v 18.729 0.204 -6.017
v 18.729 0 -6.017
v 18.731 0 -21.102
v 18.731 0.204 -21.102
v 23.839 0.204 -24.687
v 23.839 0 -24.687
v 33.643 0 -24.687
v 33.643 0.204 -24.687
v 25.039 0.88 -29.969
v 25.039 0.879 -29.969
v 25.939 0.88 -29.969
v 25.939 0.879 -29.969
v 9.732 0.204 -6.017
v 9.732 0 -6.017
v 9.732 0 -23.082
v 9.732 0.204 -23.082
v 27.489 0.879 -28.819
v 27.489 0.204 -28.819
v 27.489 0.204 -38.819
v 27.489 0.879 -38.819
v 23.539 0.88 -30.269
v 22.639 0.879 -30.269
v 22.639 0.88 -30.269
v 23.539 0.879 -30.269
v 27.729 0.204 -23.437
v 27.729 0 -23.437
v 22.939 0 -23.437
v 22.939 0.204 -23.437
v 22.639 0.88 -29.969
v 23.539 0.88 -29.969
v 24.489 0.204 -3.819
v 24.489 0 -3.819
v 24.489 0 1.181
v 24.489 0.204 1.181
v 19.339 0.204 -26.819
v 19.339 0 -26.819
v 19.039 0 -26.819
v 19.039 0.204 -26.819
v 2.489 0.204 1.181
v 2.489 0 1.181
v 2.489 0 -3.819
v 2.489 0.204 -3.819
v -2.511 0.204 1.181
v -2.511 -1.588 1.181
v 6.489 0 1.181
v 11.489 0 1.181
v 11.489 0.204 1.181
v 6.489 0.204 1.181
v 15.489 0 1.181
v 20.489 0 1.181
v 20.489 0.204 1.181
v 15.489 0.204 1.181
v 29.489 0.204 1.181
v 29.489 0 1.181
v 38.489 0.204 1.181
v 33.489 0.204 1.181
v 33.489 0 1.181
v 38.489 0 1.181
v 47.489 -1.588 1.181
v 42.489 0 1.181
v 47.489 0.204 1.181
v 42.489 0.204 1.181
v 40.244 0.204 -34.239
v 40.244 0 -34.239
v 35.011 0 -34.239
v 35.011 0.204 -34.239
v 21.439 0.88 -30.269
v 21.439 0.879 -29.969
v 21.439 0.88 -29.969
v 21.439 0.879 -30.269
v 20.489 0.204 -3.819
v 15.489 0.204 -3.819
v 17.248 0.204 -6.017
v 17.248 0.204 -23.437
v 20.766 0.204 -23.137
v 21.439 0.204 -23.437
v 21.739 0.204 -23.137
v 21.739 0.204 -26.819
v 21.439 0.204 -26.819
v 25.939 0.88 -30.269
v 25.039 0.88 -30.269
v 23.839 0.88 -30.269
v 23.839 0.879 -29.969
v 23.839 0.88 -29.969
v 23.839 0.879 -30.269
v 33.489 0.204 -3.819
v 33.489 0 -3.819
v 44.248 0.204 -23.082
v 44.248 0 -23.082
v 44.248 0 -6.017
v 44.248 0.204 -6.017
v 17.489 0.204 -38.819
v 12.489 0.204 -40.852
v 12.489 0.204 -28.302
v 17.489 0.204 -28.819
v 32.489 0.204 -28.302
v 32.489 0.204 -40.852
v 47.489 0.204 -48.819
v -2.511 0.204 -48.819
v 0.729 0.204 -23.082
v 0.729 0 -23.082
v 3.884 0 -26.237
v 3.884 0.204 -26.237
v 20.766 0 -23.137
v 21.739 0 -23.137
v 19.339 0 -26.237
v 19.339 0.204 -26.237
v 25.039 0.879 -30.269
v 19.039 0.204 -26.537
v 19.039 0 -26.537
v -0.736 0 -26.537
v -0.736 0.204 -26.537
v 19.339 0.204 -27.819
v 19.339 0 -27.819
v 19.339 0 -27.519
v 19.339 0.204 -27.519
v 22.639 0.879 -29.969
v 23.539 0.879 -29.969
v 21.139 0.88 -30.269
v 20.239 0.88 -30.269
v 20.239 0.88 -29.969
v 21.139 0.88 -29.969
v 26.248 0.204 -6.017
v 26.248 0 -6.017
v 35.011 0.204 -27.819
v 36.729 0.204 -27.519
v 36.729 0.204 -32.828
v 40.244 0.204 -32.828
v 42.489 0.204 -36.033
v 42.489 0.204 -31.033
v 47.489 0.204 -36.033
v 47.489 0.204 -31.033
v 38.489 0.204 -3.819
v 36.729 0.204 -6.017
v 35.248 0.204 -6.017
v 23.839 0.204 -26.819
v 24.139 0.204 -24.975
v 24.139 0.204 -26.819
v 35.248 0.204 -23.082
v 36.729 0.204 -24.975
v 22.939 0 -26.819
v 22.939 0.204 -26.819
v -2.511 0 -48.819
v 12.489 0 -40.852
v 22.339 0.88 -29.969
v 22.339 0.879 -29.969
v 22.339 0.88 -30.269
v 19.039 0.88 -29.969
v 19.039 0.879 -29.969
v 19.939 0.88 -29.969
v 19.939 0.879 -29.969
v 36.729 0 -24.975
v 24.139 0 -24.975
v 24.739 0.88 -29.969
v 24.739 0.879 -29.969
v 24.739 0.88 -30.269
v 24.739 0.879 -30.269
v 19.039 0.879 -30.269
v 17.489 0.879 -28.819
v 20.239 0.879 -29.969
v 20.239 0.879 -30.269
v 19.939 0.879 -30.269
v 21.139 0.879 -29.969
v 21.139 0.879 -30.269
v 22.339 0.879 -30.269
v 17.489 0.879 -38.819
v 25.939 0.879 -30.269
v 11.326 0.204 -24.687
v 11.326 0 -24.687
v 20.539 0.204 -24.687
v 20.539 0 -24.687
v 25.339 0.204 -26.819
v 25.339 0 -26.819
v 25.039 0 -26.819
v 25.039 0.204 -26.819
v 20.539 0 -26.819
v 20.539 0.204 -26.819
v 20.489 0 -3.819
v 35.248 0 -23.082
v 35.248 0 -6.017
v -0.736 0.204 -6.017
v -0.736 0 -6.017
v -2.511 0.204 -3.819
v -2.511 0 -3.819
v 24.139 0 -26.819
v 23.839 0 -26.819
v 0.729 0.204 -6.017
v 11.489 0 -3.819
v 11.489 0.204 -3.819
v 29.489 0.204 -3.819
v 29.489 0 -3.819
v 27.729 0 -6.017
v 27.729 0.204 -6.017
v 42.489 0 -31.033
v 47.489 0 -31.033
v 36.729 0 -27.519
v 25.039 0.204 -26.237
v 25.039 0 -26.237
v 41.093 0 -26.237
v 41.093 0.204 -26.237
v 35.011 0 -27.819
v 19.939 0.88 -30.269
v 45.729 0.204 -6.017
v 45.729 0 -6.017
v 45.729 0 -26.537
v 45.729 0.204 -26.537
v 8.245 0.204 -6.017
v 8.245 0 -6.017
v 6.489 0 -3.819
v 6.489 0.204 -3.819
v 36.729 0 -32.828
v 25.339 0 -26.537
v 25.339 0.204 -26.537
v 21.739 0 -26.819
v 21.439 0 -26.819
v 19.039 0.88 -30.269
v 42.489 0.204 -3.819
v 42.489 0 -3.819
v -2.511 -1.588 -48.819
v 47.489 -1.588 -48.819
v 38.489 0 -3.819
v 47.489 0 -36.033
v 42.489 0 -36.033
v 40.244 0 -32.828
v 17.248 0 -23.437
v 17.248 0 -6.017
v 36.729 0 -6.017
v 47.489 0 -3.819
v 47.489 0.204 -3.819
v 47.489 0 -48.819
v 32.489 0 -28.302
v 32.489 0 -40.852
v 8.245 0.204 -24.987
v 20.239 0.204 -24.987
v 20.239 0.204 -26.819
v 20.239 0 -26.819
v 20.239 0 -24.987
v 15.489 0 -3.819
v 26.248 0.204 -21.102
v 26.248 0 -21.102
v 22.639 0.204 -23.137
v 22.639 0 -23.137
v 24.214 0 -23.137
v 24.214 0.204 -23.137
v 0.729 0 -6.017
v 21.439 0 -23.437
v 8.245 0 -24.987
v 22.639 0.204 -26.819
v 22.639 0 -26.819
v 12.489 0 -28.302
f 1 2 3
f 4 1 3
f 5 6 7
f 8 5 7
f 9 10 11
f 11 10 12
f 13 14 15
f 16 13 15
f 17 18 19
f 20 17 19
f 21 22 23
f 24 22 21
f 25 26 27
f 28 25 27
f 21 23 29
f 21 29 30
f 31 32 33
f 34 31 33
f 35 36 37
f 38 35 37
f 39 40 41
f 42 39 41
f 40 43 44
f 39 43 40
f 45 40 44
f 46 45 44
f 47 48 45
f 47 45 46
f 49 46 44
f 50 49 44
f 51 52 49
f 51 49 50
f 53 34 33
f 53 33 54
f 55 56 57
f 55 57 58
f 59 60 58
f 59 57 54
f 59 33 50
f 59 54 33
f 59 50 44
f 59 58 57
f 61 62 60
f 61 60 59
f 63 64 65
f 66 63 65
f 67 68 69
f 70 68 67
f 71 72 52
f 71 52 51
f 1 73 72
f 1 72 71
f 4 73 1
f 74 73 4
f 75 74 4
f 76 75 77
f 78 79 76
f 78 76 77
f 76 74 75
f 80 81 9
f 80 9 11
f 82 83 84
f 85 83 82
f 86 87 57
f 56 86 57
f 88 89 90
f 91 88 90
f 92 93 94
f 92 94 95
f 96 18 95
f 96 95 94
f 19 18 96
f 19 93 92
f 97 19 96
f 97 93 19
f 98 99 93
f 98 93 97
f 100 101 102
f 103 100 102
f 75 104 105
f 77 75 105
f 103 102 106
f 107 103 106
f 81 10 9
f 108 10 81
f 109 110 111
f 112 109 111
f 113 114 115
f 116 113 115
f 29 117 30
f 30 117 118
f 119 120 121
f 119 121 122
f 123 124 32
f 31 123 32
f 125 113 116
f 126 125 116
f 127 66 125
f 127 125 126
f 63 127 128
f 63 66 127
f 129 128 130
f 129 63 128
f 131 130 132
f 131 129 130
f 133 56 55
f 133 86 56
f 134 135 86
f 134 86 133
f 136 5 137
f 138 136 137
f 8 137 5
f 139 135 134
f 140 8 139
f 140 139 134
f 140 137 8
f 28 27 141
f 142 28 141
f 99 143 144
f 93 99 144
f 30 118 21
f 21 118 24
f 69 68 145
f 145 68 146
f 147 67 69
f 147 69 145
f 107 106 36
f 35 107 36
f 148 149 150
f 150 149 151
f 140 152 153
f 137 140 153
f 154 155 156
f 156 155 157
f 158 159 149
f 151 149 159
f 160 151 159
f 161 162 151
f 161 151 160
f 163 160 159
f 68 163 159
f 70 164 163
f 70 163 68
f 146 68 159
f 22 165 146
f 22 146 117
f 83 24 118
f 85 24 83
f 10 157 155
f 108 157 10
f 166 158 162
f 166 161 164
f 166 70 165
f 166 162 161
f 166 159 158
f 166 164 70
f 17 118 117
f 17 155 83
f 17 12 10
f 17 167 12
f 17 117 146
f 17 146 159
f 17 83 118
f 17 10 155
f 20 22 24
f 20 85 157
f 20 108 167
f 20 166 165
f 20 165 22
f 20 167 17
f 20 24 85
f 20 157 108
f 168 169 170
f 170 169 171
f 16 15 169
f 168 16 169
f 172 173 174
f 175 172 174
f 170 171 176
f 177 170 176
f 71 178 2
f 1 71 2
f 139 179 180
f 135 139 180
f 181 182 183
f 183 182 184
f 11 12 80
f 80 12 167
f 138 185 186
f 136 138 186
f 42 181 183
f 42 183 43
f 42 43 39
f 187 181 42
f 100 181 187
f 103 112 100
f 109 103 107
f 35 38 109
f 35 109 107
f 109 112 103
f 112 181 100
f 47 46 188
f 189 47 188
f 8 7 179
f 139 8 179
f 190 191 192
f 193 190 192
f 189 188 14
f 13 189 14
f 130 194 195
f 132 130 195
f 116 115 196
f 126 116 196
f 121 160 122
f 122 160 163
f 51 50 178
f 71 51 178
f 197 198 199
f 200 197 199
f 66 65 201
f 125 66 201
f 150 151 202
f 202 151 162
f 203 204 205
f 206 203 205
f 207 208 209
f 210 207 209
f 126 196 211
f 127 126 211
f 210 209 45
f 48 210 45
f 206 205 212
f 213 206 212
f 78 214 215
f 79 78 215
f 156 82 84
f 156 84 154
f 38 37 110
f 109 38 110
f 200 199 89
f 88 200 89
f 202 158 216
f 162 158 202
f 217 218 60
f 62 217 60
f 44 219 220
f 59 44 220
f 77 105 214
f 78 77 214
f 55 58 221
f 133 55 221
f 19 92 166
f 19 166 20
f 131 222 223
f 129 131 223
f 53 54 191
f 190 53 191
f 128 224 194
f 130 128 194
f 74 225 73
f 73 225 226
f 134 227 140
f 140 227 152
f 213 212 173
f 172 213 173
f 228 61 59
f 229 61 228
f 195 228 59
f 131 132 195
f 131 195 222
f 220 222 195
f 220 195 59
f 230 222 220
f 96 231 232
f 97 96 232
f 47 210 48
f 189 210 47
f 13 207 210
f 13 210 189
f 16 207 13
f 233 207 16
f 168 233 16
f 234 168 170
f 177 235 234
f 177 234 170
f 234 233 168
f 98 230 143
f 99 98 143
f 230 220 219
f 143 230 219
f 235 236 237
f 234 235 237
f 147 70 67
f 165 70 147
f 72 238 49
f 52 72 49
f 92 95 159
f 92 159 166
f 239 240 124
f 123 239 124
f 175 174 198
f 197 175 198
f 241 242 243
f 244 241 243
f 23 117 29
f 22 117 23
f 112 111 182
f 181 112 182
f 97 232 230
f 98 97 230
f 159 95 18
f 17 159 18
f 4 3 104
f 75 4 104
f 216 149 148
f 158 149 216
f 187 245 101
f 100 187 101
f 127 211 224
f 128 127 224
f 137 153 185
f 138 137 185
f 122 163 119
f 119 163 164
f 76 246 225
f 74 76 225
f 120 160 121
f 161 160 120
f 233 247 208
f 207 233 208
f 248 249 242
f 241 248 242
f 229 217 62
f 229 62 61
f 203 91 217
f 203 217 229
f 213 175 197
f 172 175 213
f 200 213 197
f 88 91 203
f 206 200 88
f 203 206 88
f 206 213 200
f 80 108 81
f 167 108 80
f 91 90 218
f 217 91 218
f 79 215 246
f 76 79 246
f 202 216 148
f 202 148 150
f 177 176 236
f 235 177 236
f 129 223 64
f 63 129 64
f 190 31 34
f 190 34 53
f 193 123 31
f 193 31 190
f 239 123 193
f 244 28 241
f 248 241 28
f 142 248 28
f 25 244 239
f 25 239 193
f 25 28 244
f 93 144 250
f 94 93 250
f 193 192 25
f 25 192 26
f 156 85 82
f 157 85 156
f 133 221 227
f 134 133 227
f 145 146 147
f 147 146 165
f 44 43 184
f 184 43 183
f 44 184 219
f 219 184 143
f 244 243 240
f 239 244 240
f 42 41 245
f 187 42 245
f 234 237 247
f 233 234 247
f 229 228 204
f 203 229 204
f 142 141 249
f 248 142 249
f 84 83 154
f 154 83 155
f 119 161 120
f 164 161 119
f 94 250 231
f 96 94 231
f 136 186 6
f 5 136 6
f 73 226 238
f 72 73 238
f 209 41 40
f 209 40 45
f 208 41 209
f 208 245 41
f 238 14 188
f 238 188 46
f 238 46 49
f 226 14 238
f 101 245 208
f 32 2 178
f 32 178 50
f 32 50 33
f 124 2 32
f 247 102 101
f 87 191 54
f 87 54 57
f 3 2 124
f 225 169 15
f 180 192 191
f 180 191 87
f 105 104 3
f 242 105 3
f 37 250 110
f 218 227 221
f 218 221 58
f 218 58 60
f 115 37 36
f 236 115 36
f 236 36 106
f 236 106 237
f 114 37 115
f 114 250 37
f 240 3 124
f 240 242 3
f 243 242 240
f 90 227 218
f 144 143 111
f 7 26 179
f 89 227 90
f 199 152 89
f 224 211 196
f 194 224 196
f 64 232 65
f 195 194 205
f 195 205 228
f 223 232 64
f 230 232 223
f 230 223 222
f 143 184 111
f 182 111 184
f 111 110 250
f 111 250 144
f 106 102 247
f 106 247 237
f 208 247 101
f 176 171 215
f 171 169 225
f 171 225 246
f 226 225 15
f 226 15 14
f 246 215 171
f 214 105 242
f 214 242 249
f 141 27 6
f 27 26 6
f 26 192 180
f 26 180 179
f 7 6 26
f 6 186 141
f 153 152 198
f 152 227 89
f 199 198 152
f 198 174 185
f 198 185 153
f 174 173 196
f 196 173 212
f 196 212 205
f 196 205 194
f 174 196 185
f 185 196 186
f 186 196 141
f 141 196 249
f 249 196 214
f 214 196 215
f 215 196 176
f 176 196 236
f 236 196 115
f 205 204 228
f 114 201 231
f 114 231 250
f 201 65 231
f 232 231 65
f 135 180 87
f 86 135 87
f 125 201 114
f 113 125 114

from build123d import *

# Parameters (mm, degrees)
SKETCH3_W           = 50
SKETCH3_H           = 50
BOSS_EXTRUDE1_DEPTH = 1.5875
BOSS_EXTRUDE2_DEPTH = 0.204346
SKETCH4_W           = 10
SKETCH4_H           = 10
BOSS_EXTRUDE3_DEPTH = 0.675
SKETCH5_W           = 0.9
SKETCH5_H           = 0.3
BOSS_EXTRUDE4_DEPTH = 0.001


with BuildPart() as part:
    # Sketch3 → Boss-Extrude1 (new body)
    with BuildSketch(Plane(origin=(0, 0, 0), x_dir=(1, 0, 0), z_dir=(0, 1, 0))):
        with Locations((22.488763021, 23.818655395)):
            Rectangle(SKETCH3_W, SKETCH3_H)
    extrude(amount=-BOSS_EXTRUDE1_DEPTH)

    # Sketch2 → Boss-Extrude2 (add)
    with BuildSketch(Plane(origin=(0, 0, 0), x_dir=(1, 0, 0), z_dir=(0, 1, 0))):
        Polygon((32.488763021, 28.302249005), (32.488763021, 40.851579566), (47.488763021, 48.818655395), (-2.511236979, 48.818655395), (12.488763021, 40.851579566), (12.488763021, 28.302249005), align=None)
        Polygon((47.488763021, 31.033343899), (47.488763021, 36.033343899), (42.488763021, 36.033343899), (40.243873607, 34.239185764), (35.010861347, 34.239185764), (35.010861347, 27.818655395), (19.338763021, 27.818655395), (19.338763021, 27.518655395), (36.72925203, 27.518655395), (36.72925203, 32.827502034), (40.243873607, 32.827502034), (42.488763021, 31.033343899), align=None)
        Polygon((47.488763021, -1.181344605), (47.488763021, 3.818655395), (45.72925203, 6.01706342), (45.72925203, 26.536834752), (25.338763021, 26.536834752), (25.338763021, 26.818655395), (25.038763021, 26.818655395), (25.038763021, 26.236834752), (41.093092119, 26.236834752), (44.248274012, 23.081652859), (44.248274012, 6.01706342), (42.488763021, 3.818655395), (42.488763021, -1.181344605), align=None)
        Polygon((33.488763021, -1.181344605), (38.488763021, -1.181344605), (38.488763021, 3.818655395), (36.72925203, 6.01706342), (36.72925203, 24.975395702), (24.138763021, 24.975395702), (24.138763021, 26.818655395), (23.838763021, 26.818655395), (23.838763021, 24.686834752), (33.643092119, 24.686834752), (35.248274012, 23.081652859), (35.248274012, 6.01706342), (33.488763021, 3.818655395), align=None)
        Polygon((24.488763021, 3.818655395), (24.488763021, -1.181344605), (29.488763021, -1.181344605), (29.488763021, 3.818655395), (27.72925203, 6.01706342), (27.72925203, 23.436834752), (22.938763021, 23.436834752), (22.938763021, 26.818655395), (22.638763021, 26.818655395), (22.638763021, 23.136834752), (24.213594494, 23.136834752), (26.248274012, 21.102155233), (26.248274012, 6.01706342), align=None)
        Polygon((15.488763021, 3.818655395), (15.488763021, -1.181344605), (20.488763021, -1.181344605), (20.488763021, 3.818655395), (18.72925203, 6.01706342), (18.731288885, 21.102155233), (20.765968404, 23.136834752), (21.738763021, 23.136834752), (21.738763021, 26.818655395), (21.438763021, 26.818655395), (21.438763021, 23.436834752), (17.248274012, 23.436834752), (17.248274012, 6.01706342), align=None)
        Polygon((6.488763021, 3.818655395), (6.488763021, -1.181344605), (11.488763021, -1.181344605), (11.488763021, 3.818655395), (9.732070762, 6.01706342), (9.732070762, 23.081652859), (11.325813604, 24.686834752), (20.538763021, 24.686834752), (20.538763021, 26.818655395), (20.238763021, 26.818655395), (20.238763021, 24.986834752), (8.24545528, 24.986834752), (8.24545528, 6.01706342), align=None)
        Polygon((-0.735853149, 6.01706342), (-2.511236979, 3.818655395), (-2.511236979, -1.181344605), (2.488763021, -1.181344605), (2.488763021, 3.818655395), (0.729267736, 6.01706342), (0.729267736, 23.081652859), (3.884449629, 26.236834752), (19.338763021, 26.236834752), (19.338763021, 26.818655395), (19.038763021, 26.818655395), (19.038763021, 26.536834752), (-0.735853149, 26.536834752), align=None)
    extrude(amount=BOSS_EXTRUDE2_DEPTH)

    # Sketch4 → Boss-Extrude3 (add)
    with BuildSketch(Plane(origin=(0, 0.204346, 0), x_dir=(1, 0, 0), z_dir=(0, 1, 0))):
        with Locations((22.488763021, 33.818655395)):
            Rectangle(SKETCH4_W, SKETCH4_H)
    extrude(amount=BOSS_EXTRUDE3_DEPTH)

    # Sketch5 → Boss-Extrude4 (add)
    with BuildSketch(Plane(origin=(0, 0.879346, 0), x_dir=(1, 0, 0), z_dir=(0, 1, 0))):
        with Locations((19.488763021, 30.118655395)):
            Rectangle(SKETCH5_W, SKETCH5_H)
        with Locations((20.688763021, 30.118655395)):
            Rectangle(SKETCH5_W, SKETCH5_H)
        with Locations((21.888763021, 30.118655395)):
            Rectangle(SKETCH5_W, SKETCH5_H)
        with Locations((23.088763021, 30.118655395)):
            Rectangle(SKETCH5_W, SKETCH5_H)
        with Locations((24.288763021, 30.118655395)):
            Rectangle(SKETCH5_W, SKETCH5_H)
        with Locations((25.488763021, 30.118655395)):
            Rectangle(SKETCH5_W, SKETCH5_H)
    extrude(amount=BOSS_EXTRUDE4_DEPTH)


solid = part.part
